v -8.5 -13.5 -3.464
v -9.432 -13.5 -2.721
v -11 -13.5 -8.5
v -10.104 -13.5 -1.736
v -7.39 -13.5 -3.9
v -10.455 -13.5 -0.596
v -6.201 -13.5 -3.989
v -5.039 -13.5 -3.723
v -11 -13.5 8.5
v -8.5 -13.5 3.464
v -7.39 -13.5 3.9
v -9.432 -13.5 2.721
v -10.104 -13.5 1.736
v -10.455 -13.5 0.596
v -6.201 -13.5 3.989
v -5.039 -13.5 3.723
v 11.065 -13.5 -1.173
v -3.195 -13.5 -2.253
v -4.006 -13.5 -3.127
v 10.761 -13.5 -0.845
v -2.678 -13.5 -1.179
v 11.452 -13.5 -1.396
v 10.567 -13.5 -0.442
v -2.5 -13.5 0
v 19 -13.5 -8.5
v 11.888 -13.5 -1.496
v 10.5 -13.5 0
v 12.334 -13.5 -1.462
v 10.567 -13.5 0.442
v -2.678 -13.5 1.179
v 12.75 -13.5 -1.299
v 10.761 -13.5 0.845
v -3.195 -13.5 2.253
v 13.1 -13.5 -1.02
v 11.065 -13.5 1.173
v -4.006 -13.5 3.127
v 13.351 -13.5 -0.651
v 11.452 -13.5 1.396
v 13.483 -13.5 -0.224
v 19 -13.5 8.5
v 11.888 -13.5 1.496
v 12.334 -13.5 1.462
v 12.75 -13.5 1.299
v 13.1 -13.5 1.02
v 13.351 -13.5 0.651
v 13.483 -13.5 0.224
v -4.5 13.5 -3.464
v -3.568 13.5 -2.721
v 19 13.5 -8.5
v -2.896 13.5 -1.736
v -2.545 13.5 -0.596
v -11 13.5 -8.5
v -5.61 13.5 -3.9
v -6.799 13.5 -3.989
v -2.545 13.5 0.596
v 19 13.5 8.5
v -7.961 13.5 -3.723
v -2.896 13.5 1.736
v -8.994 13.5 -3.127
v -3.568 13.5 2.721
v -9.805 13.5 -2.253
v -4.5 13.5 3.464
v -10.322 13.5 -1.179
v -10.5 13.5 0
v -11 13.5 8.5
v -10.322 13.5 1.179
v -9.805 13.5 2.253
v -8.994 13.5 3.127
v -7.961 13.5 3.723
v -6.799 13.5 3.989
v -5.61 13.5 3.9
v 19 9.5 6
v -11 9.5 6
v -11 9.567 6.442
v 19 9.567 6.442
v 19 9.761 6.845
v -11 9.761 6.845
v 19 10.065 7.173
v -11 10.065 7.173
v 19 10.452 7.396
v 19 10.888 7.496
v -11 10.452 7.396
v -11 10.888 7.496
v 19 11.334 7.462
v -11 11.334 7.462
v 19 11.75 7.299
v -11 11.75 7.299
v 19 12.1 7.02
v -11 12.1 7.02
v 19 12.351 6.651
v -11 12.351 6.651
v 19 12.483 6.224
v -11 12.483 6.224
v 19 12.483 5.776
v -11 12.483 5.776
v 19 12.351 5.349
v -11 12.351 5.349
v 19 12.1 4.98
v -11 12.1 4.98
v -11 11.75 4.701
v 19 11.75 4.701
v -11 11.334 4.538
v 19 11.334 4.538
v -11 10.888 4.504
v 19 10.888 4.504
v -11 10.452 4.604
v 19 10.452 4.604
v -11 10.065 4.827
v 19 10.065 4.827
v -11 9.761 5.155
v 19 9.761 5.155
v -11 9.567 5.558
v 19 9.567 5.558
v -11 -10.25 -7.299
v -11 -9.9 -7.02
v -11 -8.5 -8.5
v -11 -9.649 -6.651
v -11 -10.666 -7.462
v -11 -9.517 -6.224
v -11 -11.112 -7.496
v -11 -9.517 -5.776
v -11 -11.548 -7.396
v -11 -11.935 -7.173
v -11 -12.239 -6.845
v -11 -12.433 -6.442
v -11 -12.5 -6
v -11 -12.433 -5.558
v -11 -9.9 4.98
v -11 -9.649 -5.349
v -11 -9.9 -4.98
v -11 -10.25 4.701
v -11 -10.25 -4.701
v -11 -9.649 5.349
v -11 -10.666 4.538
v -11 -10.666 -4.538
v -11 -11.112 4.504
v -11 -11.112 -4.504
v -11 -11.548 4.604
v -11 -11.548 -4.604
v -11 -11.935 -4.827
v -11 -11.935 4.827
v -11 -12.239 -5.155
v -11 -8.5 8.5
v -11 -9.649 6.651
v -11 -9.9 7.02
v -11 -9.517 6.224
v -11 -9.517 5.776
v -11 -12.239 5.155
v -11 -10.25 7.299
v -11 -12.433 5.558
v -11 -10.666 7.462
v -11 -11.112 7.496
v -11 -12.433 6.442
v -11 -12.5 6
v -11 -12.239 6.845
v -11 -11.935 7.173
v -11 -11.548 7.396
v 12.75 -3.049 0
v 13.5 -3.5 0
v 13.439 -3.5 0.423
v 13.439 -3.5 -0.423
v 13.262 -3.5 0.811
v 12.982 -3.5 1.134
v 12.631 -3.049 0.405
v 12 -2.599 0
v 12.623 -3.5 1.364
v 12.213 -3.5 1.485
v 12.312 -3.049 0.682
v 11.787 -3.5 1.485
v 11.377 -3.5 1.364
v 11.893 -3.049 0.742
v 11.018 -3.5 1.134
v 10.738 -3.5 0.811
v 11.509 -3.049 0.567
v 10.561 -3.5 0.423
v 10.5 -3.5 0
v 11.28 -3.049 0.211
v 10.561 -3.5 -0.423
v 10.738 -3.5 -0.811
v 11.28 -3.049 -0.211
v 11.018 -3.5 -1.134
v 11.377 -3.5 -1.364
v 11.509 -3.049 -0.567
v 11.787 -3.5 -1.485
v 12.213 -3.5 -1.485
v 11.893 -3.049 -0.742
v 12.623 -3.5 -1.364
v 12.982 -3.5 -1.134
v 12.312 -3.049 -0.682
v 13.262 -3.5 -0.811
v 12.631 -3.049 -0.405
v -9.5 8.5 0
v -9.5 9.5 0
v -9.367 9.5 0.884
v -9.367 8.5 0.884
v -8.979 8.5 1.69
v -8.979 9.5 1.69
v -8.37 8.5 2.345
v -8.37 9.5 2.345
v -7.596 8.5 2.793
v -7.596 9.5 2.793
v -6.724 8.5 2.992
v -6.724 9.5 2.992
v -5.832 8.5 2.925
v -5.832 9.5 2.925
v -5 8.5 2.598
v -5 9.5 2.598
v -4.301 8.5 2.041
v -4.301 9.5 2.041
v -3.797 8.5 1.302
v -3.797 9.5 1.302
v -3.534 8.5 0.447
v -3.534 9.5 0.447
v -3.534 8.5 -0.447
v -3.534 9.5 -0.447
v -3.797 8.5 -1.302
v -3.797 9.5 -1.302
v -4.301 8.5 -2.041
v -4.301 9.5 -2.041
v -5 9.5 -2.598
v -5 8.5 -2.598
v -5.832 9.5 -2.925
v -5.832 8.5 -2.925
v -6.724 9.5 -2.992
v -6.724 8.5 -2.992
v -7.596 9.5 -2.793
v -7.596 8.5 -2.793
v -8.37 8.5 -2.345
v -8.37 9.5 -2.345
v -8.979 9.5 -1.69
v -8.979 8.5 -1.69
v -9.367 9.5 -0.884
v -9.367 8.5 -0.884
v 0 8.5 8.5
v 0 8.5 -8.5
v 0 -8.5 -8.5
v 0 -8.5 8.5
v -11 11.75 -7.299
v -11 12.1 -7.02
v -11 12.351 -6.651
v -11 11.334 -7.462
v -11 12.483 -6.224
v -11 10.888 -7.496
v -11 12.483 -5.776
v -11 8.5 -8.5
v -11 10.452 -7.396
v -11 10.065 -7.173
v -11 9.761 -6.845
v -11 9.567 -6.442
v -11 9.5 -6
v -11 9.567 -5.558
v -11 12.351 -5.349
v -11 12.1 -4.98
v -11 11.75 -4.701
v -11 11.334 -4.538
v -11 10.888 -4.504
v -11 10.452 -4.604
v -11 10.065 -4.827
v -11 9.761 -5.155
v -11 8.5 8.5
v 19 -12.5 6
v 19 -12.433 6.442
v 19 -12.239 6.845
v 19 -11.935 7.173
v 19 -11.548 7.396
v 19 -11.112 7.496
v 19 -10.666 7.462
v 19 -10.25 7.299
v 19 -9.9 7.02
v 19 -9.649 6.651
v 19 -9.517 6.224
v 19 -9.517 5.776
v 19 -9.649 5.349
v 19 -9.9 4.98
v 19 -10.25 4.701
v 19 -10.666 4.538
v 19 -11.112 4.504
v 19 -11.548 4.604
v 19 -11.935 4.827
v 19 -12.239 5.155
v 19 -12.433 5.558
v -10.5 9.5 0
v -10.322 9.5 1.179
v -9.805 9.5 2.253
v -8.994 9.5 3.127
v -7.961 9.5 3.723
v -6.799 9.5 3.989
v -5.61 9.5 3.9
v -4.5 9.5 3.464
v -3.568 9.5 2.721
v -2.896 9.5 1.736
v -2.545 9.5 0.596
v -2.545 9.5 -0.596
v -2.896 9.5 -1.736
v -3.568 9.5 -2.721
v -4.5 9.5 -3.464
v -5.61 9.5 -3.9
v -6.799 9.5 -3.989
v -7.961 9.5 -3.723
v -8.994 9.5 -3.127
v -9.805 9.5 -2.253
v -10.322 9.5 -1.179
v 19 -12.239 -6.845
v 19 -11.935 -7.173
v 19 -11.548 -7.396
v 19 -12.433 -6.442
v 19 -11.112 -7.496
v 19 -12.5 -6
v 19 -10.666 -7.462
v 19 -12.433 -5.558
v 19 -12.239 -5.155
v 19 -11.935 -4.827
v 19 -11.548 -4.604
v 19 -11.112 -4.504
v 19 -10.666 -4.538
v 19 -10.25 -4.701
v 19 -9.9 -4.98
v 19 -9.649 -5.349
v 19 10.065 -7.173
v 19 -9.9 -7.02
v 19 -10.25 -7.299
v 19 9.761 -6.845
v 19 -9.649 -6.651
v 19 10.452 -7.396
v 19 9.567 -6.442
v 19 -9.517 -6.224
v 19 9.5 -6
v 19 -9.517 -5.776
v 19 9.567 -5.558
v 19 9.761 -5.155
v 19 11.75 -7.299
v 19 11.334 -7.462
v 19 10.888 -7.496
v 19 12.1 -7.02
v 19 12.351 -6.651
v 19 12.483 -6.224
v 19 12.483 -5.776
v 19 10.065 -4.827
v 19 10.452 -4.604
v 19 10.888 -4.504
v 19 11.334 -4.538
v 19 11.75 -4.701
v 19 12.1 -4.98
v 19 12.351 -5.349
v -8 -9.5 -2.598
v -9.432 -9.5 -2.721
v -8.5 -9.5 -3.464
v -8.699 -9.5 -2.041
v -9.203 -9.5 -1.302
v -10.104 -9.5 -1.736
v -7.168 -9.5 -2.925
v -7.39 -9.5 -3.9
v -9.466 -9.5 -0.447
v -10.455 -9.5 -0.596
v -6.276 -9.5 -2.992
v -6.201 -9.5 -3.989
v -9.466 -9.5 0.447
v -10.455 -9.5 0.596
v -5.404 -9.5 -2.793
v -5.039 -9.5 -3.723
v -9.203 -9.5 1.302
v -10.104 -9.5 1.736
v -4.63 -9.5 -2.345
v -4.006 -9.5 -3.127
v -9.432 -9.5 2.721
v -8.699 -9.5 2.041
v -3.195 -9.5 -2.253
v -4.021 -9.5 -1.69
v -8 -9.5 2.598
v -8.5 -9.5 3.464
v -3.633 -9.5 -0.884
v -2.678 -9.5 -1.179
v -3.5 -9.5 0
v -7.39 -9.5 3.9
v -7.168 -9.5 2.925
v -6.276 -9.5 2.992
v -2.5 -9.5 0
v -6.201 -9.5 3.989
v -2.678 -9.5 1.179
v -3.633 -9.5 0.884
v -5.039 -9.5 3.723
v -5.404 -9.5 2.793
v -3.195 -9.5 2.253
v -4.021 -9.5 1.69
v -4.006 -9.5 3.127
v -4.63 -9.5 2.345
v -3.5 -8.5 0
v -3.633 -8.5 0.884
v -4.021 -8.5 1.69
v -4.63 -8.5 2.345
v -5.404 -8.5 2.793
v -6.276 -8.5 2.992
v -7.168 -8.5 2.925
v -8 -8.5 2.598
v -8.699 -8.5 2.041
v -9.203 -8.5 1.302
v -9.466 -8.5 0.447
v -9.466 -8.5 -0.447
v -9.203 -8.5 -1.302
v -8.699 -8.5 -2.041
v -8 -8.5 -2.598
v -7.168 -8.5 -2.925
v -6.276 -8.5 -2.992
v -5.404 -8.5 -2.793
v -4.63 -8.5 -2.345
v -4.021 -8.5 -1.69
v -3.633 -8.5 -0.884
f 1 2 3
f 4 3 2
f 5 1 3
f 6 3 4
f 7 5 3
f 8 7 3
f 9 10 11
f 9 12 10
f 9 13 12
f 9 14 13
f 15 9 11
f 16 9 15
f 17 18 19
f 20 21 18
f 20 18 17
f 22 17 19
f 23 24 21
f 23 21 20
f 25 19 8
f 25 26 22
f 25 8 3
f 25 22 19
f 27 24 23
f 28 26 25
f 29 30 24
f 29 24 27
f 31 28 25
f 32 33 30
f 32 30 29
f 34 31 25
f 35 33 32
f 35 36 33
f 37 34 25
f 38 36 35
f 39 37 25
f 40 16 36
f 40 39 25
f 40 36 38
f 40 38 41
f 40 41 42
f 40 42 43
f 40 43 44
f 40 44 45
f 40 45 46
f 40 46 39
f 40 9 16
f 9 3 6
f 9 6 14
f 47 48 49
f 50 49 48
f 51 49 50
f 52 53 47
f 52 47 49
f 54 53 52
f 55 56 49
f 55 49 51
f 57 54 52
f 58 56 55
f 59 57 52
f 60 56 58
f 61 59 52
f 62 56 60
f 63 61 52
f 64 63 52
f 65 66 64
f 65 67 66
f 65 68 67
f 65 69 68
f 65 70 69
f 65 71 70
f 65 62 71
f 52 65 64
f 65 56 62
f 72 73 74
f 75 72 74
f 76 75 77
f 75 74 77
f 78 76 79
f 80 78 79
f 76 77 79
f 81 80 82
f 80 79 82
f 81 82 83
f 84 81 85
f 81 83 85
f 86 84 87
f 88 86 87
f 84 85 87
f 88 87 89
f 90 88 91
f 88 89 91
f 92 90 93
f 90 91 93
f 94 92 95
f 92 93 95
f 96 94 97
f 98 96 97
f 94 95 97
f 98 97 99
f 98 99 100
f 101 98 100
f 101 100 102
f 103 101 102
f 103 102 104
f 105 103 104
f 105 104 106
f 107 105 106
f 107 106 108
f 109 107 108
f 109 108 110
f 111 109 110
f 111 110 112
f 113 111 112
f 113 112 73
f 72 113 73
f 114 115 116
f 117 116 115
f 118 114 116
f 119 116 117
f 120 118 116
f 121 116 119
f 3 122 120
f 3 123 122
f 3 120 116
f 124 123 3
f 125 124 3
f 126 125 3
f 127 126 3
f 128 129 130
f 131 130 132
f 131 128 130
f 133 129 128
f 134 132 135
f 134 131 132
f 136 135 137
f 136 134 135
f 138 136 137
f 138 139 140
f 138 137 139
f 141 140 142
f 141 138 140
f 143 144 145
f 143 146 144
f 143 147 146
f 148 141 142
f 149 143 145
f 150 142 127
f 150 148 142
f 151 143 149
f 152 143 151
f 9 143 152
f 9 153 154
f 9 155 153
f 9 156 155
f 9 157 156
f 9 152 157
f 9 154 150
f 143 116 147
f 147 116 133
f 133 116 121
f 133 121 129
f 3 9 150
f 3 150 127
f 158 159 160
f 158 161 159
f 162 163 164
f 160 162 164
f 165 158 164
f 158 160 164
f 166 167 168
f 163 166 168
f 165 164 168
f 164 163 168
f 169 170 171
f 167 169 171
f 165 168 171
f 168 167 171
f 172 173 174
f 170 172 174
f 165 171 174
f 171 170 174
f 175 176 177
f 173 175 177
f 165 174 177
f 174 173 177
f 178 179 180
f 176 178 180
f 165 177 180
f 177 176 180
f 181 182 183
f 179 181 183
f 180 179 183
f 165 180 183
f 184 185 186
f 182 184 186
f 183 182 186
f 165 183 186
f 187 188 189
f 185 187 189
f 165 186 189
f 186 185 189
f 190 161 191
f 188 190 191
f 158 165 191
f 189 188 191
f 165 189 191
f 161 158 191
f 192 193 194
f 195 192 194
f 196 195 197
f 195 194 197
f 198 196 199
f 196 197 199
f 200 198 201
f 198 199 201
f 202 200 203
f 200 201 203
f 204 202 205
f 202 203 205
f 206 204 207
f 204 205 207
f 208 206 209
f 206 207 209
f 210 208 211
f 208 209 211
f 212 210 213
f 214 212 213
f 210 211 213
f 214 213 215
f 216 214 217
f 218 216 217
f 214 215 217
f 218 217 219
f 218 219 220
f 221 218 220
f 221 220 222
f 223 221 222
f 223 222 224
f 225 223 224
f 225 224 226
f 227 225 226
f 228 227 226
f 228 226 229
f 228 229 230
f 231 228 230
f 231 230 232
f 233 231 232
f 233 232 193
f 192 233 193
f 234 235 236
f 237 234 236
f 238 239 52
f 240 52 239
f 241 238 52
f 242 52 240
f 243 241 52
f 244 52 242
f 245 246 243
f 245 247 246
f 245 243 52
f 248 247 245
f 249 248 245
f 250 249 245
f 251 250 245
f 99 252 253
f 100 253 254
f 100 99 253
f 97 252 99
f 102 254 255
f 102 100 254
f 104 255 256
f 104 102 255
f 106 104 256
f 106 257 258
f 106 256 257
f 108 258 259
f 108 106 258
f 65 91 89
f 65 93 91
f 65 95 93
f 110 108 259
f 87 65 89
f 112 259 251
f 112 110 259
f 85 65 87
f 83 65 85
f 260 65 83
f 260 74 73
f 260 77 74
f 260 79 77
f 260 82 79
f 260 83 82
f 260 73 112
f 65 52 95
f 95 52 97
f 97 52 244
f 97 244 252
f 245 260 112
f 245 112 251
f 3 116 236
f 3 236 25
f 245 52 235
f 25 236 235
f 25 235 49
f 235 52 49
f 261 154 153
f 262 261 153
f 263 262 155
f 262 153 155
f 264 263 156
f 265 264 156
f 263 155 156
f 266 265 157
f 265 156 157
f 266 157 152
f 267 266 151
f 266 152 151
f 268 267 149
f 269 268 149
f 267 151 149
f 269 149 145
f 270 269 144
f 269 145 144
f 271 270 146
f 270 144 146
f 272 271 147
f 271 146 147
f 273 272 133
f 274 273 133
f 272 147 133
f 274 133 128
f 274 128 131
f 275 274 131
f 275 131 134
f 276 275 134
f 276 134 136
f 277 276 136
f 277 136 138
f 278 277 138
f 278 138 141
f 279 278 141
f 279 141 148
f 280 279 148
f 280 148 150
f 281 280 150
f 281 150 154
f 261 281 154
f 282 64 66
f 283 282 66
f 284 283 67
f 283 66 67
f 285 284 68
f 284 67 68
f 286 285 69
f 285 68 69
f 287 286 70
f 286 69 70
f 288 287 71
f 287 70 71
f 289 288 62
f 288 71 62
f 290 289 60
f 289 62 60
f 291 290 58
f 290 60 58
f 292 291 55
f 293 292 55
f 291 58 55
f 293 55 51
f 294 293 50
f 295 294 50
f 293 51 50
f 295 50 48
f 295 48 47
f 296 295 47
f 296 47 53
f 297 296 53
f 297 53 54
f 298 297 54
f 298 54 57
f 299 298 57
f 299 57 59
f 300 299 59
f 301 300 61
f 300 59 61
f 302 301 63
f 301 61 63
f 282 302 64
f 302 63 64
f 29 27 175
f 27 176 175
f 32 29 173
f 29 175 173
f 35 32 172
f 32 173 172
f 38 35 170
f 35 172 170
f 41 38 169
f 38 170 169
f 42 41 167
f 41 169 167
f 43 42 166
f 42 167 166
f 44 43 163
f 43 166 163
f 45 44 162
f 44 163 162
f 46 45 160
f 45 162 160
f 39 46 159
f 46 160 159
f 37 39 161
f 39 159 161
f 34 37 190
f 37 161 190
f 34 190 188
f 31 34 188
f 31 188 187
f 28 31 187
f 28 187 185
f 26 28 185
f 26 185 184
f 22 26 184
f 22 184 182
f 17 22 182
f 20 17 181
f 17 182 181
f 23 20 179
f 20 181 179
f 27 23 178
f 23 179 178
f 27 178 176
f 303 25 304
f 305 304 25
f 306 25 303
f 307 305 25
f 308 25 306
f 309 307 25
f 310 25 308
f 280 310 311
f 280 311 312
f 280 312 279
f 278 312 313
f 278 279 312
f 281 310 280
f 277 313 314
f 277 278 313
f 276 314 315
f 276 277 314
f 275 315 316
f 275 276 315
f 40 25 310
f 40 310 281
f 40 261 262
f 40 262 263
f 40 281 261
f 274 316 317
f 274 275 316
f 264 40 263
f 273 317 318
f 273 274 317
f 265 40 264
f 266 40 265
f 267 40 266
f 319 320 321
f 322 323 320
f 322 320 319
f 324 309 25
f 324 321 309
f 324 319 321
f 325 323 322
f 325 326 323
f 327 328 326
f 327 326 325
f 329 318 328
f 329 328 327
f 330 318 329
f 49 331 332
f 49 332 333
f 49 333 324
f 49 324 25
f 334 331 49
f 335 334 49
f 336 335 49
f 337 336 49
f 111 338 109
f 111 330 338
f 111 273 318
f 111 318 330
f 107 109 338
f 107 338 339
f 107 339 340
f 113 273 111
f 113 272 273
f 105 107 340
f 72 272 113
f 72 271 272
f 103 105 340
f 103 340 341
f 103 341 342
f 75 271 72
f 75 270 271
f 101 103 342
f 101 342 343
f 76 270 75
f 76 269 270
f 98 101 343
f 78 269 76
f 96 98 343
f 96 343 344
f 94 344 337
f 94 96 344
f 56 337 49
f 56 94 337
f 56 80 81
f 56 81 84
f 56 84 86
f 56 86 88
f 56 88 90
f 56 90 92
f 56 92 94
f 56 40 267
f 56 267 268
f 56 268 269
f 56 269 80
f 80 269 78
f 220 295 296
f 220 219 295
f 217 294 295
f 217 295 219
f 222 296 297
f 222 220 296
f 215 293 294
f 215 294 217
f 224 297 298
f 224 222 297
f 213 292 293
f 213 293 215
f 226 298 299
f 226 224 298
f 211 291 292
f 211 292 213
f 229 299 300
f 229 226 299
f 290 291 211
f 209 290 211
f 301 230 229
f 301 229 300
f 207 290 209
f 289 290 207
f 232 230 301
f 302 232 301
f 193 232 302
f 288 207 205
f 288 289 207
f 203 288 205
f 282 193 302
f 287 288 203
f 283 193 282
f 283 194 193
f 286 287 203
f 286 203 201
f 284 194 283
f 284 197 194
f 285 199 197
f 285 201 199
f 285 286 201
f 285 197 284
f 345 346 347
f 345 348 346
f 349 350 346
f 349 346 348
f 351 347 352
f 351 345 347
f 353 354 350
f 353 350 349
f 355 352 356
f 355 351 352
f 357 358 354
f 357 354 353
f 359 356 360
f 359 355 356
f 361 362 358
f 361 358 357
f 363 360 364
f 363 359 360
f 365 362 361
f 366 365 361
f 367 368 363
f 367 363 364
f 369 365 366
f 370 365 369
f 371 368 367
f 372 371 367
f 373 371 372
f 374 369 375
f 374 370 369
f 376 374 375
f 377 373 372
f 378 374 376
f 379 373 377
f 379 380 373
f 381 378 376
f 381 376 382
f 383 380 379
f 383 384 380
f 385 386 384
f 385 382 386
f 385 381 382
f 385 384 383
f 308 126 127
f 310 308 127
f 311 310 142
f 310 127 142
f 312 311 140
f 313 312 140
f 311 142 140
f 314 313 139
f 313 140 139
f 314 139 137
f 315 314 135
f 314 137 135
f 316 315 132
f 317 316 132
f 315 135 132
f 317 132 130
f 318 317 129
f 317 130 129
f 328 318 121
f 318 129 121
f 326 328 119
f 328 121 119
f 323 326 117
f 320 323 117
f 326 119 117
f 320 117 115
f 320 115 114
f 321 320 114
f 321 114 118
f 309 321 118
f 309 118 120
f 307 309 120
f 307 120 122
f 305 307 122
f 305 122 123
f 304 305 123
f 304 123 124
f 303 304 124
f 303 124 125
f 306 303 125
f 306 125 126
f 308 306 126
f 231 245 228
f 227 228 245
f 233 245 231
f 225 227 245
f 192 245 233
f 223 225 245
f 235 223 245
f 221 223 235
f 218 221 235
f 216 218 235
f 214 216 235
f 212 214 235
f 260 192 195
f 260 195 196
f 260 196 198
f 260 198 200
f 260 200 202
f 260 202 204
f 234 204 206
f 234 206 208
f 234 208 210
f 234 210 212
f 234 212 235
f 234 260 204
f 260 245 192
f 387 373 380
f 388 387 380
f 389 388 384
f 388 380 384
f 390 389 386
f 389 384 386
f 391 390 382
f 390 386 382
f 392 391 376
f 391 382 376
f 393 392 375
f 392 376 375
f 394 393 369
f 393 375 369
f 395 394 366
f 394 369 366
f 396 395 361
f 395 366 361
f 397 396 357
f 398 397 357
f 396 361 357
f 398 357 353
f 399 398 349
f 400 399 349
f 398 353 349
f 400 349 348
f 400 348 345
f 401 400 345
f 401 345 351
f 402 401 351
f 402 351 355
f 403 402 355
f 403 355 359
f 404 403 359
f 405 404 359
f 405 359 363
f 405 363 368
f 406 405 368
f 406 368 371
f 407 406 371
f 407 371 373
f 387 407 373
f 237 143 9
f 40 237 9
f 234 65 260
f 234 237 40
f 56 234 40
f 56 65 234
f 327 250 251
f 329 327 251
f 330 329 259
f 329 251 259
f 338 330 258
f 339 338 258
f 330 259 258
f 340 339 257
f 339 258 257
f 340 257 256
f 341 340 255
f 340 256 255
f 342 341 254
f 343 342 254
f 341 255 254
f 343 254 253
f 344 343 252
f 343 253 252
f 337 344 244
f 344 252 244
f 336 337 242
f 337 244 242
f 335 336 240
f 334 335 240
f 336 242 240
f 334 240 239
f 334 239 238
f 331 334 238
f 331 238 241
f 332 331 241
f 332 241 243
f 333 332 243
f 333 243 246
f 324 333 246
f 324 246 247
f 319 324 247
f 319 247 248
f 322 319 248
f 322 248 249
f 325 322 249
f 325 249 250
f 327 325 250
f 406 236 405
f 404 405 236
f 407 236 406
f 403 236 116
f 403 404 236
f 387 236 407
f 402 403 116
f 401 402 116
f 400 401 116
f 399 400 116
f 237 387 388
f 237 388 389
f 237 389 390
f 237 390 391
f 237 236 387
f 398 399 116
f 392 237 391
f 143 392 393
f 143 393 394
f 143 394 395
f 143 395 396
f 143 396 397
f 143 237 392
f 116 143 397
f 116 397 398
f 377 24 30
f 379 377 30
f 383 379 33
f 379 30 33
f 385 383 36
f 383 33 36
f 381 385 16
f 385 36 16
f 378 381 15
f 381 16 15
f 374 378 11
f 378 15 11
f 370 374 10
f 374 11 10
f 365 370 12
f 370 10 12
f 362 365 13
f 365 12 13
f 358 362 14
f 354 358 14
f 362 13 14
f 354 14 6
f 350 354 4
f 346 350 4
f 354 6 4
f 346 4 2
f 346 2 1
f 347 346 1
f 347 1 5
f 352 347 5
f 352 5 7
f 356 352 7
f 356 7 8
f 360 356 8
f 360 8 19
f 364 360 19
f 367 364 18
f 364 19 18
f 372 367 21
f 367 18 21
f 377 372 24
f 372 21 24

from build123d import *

# Parameters (mm, degrees)
F1_DEPTH  = 8.5
F2_R      = 3
F3_DEPTH  = 5
F2_R_2    = 4
F4_DEPTH  = 4
F5_R      = 3
F6_DEPTH  = 5
F5_R_2    = 4
F7_DEPTH  = 4
F9_D      = 3
F10_D     = 3
F10_DEPTH = 10
F10_TIP   = 0.9012909285


with BuildPart() as f1:
    # F0 (on Top) → F1 (new body, symmetric)
    with BuildSketch(Plane.XY):
        Polygon((19, 13.5), (-11, 13.5), (-11, 8.5), (0, 8.5), (0, -8.5), (-11, -8.5), (-11, -13.5), (19, -13.5), align=None)
    extrude(amount=F1_DEPTH, both=True)

    # F2 (on face) → F3 (cut, through all)
    with BuildSketch(Plane.XZ.offset(13.5)):
        with Locations((-6.5, 0)):
            Circle(F2_R)
    extrude(amount=-F3_DEPTH, mode=Mode.SUBTRACT)

    # F2 (on face) → F4 (cut)
    with BuildSketch(Plane.XZ.offset(13.5)):
        with Locations((-6.5, 0)):
            Circle(F2_R_2)
        with Locations((-6.5, 0)):
            Circle(F2_R, mode=Mode.SUBTRACT)
    extrude(amount=-F4_DEPTH, mode=Mode.SUBTRACT)

    # F5 (on face) → F6 (cut, through all)
    with BuildSketch(Plane(origin=(0, 13.5, 0), x_dir=(-1, 0, 0), z_dir=(0, 1, 0))):
        with Locations((6.5, 0)):
            Circle(F5_R)
    extrude(amount=-F6_DEPTH, mode=Mode.SUBTRACT)

    # F5 (on face) → F7 (cut)
    with BuildSketch(Plane(origin=(0, 13.5, 0), x_dir=(-1, 0, 0), z_dir=(0, 1, 0))):
        with Locations((6.5, 0)):
            Circle(F5_R_2)
        with Locations((6.5, 0)):
            Circle(F5_R, mode=Mode.SUBTRACT)
    extrude(amount=-F7_DEPTH, mode=Mode.SUBTRACT)

    # F9 (through all)
    with Locations(Plane.YZ.offset(19)):
        with Locations((-11, 6), (-11, -6), (11, -6), (11, 6)):
            Hole(F9_D / 2)

    # F10
    with Locations(Plane.XZ.offset(13.5)):
        with Locations((12, 0)):
            Hole(F10_D / 2, depth=F10_DEPTH)
            with Locations((0, 0, -(F10_DEPTH + F10_TIP / 2))):  # 118° drill point
                Cone(0, F10_D / 2, F10_TIP, mode=Mode.SUBTRACT)


solid = f1.part
